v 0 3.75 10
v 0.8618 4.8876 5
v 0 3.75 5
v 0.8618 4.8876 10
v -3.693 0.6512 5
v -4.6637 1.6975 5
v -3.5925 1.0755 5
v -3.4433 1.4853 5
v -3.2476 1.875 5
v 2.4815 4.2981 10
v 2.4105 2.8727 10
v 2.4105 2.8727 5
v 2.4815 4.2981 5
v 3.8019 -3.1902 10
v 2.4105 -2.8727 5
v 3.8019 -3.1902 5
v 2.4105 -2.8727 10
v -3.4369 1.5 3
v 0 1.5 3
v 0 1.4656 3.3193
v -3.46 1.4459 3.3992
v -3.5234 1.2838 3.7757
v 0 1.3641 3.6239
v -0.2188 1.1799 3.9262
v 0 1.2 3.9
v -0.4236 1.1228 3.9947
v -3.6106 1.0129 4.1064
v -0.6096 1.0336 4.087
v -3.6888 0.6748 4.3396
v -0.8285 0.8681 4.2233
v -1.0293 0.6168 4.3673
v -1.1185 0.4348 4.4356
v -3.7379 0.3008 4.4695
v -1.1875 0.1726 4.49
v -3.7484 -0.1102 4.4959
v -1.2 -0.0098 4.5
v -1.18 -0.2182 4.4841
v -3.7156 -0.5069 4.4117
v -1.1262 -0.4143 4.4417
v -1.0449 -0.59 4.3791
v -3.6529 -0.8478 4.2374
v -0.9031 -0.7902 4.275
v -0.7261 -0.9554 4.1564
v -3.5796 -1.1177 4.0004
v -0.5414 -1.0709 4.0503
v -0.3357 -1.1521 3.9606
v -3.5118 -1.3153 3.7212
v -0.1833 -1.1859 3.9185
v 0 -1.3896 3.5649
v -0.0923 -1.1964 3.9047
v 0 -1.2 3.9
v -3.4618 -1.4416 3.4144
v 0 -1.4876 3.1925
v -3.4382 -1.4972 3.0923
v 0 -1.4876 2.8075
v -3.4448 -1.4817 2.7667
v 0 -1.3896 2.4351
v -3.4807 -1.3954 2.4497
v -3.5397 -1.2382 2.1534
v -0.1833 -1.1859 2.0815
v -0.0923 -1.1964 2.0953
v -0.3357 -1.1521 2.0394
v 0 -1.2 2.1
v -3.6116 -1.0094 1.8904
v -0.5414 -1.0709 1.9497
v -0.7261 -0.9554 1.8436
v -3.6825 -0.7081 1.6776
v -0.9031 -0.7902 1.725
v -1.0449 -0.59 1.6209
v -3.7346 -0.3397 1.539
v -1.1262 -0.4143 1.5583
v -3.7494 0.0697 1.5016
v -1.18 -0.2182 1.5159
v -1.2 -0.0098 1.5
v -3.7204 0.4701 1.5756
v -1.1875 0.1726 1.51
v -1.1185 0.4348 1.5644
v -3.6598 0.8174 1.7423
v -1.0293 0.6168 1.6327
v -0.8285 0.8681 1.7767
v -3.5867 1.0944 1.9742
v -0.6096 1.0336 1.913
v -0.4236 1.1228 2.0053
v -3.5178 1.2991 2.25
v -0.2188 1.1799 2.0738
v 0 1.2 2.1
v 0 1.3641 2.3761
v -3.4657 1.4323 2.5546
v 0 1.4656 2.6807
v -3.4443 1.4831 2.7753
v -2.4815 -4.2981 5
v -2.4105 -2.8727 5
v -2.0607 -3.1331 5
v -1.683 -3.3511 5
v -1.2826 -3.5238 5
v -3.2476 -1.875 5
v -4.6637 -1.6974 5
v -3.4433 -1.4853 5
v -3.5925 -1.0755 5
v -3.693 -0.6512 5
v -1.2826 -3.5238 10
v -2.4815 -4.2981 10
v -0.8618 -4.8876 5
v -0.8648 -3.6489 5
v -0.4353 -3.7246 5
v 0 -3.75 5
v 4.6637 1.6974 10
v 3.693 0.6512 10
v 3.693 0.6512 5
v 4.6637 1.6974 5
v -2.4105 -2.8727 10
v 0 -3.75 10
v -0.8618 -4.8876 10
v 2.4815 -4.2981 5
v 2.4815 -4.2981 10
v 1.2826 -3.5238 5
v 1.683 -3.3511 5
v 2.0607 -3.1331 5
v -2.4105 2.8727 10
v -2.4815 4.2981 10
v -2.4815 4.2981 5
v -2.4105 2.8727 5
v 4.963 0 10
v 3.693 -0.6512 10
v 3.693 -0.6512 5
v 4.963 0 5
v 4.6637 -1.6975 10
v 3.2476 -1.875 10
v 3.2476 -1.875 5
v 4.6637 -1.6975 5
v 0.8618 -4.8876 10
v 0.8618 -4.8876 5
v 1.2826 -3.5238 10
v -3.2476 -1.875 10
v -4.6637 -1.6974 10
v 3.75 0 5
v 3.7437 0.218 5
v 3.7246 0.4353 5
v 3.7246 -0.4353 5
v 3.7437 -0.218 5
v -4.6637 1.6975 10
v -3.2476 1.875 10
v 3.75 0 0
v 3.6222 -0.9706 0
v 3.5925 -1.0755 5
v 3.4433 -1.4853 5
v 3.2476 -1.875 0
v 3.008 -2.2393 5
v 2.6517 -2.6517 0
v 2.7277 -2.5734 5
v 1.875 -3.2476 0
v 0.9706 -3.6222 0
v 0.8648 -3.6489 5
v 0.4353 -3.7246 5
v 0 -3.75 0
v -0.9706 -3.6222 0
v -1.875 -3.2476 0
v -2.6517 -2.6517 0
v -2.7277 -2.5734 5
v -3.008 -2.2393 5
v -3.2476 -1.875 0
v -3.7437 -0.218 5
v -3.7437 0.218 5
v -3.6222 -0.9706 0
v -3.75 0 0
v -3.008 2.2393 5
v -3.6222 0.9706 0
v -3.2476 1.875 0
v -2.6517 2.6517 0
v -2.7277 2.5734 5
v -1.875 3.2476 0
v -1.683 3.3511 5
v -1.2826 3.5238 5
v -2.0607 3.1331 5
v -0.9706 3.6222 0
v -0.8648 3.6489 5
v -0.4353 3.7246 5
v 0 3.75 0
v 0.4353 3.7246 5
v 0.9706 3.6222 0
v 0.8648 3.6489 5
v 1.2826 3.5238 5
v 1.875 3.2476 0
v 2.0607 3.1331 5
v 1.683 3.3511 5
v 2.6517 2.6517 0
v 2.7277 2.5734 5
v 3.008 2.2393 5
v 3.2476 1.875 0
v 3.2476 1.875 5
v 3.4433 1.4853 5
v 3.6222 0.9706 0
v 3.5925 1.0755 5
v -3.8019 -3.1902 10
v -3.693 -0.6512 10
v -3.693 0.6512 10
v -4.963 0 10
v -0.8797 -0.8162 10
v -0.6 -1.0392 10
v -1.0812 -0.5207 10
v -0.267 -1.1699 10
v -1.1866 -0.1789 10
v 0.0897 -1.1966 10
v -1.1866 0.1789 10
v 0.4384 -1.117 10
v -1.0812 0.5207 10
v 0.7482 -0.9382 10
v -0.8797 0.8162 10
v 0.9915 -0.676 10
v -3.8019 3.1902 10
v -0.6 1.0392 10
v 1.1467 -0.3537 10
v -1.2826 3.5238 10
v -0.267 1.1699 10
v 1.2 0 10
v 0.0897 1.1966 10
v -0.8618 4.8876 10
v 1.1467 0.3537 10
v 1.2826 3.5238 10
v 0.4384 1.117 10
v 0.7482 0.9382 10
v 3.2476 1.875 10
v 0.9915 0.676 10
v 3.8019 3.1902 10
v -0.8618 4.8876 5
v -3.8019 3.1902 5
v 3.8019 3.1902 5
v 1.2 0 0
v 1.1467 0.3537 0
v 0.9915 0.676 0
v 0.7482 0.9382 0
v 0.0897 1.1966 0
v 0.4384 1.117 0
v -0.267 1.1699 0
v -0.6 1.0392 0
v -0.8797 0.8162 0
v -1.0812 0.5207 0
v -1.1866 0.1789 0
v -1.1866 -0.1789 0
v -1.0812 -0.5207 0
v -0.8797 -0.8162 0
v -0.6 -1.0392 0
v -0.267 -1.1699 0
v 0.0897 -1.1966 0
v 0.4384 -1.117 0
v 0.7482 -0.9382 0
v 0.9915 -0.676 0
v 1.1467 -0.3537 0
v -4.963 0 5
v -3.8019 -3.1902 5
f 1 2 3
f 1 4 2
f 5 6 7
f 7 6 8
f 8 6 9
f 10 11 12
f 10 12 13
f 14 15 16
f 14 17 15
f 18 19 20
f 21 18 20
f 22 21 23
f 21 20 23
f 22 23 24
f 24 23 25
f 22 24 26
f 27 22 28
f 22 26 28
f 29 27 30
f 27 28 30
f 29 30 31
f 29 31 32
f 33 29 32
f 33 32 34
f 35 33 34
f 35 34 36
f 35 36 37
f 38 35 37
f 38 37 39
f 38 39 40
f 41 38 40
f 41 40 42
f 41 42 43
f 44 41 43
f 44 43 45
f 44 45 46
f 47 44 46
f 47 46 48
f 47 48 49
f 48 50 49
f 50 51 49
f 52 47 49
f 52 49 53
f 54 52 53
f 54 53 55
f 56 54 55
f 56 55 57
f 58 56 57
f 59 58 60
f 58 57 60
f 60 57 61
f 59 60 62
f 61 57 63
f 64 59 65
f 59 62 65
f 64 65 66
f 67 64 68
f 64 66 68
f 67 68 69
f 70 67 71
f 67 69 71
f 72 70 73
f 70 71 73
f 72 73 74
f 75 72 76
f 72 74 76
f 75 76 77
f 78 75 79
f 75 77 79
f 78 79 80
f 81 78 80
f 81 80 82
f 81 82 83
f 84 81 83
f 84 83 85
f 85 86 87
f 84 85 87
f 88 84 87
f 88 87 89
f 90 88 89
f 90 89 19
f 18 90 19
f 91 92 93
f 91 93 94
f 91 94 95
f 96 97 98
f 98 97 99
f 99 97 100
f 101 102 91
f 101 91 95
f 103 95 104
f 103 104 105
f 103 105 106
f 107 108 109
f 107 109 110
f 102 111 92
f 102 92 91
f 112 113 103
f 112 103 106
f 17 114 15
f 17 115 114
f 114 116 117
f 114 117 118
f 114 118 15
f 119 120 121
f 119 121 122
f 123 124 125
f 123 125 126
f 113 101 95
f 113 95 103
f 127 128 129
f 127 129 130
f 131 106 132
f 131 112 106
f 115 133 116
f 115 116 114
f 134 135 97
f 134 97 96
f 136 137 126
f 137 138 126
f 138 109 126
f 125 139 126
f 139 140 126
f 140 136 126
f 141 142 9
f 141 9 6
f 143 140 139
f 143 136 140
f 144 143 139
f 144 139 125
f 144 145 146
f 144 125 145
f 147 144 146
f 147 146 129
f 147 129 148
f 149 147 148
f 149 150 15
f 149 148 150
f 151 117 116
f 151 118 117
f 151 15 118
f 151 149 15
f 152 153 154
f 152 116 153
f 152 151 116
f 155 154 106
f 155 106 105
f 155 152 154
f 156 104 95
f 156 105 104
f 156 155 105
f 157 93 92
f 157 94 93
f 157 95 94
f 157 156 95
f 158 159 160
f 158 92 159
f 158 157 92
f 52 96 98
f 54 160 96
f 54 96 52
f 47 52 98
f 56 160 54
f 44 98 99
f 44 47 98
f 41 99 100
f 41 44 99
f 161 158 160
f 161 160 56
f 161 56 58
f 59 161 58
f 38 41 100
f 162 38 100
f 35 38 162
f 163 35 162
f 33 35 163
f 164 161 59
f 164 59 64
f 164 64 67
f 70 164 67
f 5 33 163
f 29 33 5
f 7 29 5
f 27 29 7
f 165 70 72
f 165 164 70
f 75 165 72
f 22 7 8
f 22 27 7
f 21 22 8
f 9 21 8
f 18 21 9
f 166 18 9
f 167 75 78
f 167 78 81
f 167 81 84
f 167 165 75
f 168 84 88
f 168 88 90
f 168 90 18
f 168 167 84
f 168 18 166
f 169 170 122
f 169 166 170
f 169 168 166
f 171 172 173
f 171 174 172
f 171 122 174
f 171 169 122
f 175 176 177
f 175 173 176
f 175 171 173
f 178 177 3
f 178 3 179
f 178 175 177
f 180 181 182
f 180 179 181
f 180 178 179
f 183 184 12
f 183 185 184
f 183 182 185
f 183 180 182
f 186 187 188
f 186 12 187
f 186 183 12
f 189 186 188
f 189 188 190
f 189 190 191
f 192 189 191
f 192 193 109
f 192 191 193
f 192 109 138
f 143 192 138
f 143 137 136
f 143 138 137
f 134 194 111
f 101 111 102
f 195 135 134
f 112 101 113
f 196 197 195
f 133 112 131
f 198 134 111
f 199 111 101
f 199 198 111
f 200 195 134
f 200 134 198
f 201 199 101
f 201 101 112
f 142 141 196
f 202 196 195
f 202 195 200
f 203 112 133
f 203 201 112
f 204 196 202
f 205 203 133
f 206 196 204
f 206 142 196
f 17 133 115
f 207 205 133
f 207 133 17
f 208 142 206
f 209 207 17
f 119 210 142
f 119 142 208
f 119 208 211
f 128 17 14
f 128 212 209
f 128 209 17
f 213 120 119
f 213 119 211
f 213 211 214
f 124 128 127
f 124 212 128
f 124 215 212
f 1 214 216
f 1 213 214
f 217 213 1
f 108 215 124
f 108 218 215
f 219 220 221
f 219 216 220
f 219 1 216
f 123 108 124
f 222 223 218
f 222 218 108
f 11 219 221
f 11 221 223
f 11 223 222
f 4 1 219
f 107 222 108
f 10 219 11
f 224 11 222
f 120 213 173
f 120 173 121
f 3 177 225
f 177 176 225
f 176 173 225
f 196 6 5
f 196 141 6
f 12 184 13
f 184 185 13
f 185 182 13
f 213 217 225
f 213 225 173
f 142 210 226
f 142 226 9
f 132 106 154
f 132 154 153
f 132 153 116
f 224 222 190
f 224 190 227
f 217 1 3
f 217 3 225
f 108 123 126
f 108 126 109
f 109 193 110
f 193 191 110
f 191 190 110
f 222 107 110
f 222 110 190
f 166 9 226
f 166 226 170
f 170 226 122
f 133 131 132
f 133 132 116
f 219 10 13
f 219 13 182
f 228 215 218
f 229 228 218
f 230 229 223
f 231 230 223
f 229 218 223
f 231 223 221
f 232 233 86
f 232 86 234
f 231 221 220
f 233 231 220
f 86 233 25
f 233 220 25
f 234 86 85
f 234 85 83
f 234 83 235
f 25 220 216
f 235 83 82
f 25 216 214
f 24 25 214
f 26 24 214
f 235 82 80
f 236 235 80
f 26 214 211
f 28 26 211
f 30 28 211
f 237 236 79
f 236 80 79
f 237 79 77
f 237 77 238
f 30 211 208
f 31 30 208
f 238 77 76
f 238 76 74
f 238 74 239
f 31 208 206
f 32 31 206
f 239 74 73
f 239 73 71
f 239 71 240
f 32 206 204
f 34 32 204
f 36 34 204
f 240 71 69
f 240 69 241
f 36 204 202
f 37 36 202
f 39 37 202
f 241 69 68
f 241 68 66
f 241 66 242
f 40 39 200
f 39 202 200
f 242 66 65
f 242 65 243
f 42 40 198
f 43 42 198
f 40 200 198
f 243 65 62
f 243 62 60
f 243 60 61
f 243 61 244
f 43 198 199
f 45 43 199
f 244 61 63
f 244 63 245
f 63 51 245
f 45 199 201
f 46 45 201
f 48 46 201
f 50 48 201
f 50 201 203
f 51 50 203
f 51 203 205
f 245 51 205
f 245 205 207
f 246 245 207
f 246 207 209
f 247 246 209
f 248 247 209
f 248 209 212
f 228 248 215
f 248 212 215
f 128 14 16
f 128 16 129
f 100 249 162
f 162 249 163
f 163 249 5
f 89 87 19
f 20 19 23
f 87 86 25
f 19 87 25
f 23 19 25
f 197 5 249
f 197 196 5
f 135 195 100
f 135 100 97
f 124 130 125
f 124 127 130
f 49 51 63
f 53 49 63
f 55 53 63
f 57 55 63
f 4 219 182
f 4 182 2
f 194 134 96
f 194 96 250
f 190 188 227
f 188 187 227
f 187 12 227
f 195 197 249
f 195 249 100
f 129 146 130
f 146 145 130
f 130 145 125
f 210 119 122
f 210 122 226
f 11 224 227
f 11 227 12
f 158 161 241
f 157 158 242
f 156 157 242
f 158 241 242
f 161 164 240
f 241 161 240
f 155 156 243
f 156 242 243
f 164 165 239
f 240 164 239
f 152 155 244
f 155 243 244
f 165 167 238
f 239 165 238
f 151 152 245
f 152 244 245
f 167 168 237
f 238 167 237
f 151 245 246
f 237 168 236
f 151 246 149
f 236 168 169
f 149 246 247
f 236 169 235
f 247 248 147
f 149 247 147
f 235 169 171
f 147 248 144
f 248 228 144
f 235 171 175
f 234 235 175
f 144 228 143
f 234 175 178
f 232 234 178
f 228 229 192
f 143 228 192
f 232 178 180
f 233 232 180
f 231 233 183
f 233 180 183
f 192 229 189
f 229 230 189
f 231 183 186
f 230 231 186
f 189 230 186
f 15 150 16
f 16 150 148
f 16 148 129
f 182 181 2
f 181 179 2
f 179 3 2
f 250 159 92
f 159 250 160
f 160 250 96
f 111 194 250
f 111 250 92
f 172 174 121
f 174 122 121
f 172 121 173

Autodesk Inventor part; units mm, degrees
ref_plane "YZ Plane" through (0, 0, 0) normal (1, 0, 0) x (0, 1, 0)
ref_plane "XZ Plane" through (0, 0, 0) normal (0, 1, 0) x (-1, 0, 0)
ref_plane "XY Plane" through (0, 0, 0) normal (0, 0, 1) x (1, 0, 0)
sketch "Esquisse1" plane through (0, 0, 0) normal (0, 0, 1) x (1, 0, 0)
  circle A0 centre (0, 0) radius 3.75
  dimension "d0" = 7.5
extrude "Extrusion1" add sketch "Esquisse1" along normal blind 5
sketch "Esquisse3" plane through (0, 0, 5) normal (0, 0, 1) x (1, 0, 0)
  circle A0 centre (0, 0) radius 5
  dimension "d12" = 10
extrude "Extrusion2" add sketch "Esquisse3" along normal blind 5
sketch "Esquisse4" plane through (0, 0, 10) normal (0, 0, 1) x (1, 0, 0)
  circle A0 centre (0, 0) radius 3.75
  circle A1 centre (0, 0) radius 5 projected
  circle A2 centre (0, 0) radius 3.75 projected
  line L0 (0, 3.75) -> (-0.9296, 4.9771)
  line L1 (-0.9296, 4.9771) -> (-1, 5.07)
  line L2 (-1, 5.07) -> (1, 5.07)
  line L3 (1, 5.07) -> (0, 3.75)
  dimension "d15" = 7.5
  dimension "d16" = 2
  dimension "d17" = 1.32
  dimension "d18" = 1
extrude "Extrusion3" cut sketch "Esquisse4" against normal blind 5 contours L0 A1 L3 | L0 L1 L2 L3 A1 picked at (0.3946, 4.554)
pattern_circular "Réseau circulaire1" count 18 over 360 about axis through (0, 0, 5) along (0, 0, 1) of "Extrusion3"
sketch "Esquisse5" plane through (0, 0, 10) normal (0, 0, 1) x (1, 0, 0)
  circle A0 centre (0, 0) radius 1.2
  dimension "d24" = 2.4
extrude "Extrusion4" cut sketch "Esquisse5" against normal through all
sketch "Esquisse6" plane through (0, 0, 0) normal (1, 0, 0) x (0, 1, 0)
  circle A0 centre (0, 3) radius 1.5
  line L0 (-3.75, 0) -> (3.75, 0) projected
  point P0 (0, 0)
  dimension "d27" = 3
  dimension "d28" = 3
extrude "Extrusion5" cut sketch "Esquisse6" against normal blind 5
equation "\"d18\" = 0.5 * d16"
properties part number "Pignon" material "Laiton, jaune doux, soudé"
